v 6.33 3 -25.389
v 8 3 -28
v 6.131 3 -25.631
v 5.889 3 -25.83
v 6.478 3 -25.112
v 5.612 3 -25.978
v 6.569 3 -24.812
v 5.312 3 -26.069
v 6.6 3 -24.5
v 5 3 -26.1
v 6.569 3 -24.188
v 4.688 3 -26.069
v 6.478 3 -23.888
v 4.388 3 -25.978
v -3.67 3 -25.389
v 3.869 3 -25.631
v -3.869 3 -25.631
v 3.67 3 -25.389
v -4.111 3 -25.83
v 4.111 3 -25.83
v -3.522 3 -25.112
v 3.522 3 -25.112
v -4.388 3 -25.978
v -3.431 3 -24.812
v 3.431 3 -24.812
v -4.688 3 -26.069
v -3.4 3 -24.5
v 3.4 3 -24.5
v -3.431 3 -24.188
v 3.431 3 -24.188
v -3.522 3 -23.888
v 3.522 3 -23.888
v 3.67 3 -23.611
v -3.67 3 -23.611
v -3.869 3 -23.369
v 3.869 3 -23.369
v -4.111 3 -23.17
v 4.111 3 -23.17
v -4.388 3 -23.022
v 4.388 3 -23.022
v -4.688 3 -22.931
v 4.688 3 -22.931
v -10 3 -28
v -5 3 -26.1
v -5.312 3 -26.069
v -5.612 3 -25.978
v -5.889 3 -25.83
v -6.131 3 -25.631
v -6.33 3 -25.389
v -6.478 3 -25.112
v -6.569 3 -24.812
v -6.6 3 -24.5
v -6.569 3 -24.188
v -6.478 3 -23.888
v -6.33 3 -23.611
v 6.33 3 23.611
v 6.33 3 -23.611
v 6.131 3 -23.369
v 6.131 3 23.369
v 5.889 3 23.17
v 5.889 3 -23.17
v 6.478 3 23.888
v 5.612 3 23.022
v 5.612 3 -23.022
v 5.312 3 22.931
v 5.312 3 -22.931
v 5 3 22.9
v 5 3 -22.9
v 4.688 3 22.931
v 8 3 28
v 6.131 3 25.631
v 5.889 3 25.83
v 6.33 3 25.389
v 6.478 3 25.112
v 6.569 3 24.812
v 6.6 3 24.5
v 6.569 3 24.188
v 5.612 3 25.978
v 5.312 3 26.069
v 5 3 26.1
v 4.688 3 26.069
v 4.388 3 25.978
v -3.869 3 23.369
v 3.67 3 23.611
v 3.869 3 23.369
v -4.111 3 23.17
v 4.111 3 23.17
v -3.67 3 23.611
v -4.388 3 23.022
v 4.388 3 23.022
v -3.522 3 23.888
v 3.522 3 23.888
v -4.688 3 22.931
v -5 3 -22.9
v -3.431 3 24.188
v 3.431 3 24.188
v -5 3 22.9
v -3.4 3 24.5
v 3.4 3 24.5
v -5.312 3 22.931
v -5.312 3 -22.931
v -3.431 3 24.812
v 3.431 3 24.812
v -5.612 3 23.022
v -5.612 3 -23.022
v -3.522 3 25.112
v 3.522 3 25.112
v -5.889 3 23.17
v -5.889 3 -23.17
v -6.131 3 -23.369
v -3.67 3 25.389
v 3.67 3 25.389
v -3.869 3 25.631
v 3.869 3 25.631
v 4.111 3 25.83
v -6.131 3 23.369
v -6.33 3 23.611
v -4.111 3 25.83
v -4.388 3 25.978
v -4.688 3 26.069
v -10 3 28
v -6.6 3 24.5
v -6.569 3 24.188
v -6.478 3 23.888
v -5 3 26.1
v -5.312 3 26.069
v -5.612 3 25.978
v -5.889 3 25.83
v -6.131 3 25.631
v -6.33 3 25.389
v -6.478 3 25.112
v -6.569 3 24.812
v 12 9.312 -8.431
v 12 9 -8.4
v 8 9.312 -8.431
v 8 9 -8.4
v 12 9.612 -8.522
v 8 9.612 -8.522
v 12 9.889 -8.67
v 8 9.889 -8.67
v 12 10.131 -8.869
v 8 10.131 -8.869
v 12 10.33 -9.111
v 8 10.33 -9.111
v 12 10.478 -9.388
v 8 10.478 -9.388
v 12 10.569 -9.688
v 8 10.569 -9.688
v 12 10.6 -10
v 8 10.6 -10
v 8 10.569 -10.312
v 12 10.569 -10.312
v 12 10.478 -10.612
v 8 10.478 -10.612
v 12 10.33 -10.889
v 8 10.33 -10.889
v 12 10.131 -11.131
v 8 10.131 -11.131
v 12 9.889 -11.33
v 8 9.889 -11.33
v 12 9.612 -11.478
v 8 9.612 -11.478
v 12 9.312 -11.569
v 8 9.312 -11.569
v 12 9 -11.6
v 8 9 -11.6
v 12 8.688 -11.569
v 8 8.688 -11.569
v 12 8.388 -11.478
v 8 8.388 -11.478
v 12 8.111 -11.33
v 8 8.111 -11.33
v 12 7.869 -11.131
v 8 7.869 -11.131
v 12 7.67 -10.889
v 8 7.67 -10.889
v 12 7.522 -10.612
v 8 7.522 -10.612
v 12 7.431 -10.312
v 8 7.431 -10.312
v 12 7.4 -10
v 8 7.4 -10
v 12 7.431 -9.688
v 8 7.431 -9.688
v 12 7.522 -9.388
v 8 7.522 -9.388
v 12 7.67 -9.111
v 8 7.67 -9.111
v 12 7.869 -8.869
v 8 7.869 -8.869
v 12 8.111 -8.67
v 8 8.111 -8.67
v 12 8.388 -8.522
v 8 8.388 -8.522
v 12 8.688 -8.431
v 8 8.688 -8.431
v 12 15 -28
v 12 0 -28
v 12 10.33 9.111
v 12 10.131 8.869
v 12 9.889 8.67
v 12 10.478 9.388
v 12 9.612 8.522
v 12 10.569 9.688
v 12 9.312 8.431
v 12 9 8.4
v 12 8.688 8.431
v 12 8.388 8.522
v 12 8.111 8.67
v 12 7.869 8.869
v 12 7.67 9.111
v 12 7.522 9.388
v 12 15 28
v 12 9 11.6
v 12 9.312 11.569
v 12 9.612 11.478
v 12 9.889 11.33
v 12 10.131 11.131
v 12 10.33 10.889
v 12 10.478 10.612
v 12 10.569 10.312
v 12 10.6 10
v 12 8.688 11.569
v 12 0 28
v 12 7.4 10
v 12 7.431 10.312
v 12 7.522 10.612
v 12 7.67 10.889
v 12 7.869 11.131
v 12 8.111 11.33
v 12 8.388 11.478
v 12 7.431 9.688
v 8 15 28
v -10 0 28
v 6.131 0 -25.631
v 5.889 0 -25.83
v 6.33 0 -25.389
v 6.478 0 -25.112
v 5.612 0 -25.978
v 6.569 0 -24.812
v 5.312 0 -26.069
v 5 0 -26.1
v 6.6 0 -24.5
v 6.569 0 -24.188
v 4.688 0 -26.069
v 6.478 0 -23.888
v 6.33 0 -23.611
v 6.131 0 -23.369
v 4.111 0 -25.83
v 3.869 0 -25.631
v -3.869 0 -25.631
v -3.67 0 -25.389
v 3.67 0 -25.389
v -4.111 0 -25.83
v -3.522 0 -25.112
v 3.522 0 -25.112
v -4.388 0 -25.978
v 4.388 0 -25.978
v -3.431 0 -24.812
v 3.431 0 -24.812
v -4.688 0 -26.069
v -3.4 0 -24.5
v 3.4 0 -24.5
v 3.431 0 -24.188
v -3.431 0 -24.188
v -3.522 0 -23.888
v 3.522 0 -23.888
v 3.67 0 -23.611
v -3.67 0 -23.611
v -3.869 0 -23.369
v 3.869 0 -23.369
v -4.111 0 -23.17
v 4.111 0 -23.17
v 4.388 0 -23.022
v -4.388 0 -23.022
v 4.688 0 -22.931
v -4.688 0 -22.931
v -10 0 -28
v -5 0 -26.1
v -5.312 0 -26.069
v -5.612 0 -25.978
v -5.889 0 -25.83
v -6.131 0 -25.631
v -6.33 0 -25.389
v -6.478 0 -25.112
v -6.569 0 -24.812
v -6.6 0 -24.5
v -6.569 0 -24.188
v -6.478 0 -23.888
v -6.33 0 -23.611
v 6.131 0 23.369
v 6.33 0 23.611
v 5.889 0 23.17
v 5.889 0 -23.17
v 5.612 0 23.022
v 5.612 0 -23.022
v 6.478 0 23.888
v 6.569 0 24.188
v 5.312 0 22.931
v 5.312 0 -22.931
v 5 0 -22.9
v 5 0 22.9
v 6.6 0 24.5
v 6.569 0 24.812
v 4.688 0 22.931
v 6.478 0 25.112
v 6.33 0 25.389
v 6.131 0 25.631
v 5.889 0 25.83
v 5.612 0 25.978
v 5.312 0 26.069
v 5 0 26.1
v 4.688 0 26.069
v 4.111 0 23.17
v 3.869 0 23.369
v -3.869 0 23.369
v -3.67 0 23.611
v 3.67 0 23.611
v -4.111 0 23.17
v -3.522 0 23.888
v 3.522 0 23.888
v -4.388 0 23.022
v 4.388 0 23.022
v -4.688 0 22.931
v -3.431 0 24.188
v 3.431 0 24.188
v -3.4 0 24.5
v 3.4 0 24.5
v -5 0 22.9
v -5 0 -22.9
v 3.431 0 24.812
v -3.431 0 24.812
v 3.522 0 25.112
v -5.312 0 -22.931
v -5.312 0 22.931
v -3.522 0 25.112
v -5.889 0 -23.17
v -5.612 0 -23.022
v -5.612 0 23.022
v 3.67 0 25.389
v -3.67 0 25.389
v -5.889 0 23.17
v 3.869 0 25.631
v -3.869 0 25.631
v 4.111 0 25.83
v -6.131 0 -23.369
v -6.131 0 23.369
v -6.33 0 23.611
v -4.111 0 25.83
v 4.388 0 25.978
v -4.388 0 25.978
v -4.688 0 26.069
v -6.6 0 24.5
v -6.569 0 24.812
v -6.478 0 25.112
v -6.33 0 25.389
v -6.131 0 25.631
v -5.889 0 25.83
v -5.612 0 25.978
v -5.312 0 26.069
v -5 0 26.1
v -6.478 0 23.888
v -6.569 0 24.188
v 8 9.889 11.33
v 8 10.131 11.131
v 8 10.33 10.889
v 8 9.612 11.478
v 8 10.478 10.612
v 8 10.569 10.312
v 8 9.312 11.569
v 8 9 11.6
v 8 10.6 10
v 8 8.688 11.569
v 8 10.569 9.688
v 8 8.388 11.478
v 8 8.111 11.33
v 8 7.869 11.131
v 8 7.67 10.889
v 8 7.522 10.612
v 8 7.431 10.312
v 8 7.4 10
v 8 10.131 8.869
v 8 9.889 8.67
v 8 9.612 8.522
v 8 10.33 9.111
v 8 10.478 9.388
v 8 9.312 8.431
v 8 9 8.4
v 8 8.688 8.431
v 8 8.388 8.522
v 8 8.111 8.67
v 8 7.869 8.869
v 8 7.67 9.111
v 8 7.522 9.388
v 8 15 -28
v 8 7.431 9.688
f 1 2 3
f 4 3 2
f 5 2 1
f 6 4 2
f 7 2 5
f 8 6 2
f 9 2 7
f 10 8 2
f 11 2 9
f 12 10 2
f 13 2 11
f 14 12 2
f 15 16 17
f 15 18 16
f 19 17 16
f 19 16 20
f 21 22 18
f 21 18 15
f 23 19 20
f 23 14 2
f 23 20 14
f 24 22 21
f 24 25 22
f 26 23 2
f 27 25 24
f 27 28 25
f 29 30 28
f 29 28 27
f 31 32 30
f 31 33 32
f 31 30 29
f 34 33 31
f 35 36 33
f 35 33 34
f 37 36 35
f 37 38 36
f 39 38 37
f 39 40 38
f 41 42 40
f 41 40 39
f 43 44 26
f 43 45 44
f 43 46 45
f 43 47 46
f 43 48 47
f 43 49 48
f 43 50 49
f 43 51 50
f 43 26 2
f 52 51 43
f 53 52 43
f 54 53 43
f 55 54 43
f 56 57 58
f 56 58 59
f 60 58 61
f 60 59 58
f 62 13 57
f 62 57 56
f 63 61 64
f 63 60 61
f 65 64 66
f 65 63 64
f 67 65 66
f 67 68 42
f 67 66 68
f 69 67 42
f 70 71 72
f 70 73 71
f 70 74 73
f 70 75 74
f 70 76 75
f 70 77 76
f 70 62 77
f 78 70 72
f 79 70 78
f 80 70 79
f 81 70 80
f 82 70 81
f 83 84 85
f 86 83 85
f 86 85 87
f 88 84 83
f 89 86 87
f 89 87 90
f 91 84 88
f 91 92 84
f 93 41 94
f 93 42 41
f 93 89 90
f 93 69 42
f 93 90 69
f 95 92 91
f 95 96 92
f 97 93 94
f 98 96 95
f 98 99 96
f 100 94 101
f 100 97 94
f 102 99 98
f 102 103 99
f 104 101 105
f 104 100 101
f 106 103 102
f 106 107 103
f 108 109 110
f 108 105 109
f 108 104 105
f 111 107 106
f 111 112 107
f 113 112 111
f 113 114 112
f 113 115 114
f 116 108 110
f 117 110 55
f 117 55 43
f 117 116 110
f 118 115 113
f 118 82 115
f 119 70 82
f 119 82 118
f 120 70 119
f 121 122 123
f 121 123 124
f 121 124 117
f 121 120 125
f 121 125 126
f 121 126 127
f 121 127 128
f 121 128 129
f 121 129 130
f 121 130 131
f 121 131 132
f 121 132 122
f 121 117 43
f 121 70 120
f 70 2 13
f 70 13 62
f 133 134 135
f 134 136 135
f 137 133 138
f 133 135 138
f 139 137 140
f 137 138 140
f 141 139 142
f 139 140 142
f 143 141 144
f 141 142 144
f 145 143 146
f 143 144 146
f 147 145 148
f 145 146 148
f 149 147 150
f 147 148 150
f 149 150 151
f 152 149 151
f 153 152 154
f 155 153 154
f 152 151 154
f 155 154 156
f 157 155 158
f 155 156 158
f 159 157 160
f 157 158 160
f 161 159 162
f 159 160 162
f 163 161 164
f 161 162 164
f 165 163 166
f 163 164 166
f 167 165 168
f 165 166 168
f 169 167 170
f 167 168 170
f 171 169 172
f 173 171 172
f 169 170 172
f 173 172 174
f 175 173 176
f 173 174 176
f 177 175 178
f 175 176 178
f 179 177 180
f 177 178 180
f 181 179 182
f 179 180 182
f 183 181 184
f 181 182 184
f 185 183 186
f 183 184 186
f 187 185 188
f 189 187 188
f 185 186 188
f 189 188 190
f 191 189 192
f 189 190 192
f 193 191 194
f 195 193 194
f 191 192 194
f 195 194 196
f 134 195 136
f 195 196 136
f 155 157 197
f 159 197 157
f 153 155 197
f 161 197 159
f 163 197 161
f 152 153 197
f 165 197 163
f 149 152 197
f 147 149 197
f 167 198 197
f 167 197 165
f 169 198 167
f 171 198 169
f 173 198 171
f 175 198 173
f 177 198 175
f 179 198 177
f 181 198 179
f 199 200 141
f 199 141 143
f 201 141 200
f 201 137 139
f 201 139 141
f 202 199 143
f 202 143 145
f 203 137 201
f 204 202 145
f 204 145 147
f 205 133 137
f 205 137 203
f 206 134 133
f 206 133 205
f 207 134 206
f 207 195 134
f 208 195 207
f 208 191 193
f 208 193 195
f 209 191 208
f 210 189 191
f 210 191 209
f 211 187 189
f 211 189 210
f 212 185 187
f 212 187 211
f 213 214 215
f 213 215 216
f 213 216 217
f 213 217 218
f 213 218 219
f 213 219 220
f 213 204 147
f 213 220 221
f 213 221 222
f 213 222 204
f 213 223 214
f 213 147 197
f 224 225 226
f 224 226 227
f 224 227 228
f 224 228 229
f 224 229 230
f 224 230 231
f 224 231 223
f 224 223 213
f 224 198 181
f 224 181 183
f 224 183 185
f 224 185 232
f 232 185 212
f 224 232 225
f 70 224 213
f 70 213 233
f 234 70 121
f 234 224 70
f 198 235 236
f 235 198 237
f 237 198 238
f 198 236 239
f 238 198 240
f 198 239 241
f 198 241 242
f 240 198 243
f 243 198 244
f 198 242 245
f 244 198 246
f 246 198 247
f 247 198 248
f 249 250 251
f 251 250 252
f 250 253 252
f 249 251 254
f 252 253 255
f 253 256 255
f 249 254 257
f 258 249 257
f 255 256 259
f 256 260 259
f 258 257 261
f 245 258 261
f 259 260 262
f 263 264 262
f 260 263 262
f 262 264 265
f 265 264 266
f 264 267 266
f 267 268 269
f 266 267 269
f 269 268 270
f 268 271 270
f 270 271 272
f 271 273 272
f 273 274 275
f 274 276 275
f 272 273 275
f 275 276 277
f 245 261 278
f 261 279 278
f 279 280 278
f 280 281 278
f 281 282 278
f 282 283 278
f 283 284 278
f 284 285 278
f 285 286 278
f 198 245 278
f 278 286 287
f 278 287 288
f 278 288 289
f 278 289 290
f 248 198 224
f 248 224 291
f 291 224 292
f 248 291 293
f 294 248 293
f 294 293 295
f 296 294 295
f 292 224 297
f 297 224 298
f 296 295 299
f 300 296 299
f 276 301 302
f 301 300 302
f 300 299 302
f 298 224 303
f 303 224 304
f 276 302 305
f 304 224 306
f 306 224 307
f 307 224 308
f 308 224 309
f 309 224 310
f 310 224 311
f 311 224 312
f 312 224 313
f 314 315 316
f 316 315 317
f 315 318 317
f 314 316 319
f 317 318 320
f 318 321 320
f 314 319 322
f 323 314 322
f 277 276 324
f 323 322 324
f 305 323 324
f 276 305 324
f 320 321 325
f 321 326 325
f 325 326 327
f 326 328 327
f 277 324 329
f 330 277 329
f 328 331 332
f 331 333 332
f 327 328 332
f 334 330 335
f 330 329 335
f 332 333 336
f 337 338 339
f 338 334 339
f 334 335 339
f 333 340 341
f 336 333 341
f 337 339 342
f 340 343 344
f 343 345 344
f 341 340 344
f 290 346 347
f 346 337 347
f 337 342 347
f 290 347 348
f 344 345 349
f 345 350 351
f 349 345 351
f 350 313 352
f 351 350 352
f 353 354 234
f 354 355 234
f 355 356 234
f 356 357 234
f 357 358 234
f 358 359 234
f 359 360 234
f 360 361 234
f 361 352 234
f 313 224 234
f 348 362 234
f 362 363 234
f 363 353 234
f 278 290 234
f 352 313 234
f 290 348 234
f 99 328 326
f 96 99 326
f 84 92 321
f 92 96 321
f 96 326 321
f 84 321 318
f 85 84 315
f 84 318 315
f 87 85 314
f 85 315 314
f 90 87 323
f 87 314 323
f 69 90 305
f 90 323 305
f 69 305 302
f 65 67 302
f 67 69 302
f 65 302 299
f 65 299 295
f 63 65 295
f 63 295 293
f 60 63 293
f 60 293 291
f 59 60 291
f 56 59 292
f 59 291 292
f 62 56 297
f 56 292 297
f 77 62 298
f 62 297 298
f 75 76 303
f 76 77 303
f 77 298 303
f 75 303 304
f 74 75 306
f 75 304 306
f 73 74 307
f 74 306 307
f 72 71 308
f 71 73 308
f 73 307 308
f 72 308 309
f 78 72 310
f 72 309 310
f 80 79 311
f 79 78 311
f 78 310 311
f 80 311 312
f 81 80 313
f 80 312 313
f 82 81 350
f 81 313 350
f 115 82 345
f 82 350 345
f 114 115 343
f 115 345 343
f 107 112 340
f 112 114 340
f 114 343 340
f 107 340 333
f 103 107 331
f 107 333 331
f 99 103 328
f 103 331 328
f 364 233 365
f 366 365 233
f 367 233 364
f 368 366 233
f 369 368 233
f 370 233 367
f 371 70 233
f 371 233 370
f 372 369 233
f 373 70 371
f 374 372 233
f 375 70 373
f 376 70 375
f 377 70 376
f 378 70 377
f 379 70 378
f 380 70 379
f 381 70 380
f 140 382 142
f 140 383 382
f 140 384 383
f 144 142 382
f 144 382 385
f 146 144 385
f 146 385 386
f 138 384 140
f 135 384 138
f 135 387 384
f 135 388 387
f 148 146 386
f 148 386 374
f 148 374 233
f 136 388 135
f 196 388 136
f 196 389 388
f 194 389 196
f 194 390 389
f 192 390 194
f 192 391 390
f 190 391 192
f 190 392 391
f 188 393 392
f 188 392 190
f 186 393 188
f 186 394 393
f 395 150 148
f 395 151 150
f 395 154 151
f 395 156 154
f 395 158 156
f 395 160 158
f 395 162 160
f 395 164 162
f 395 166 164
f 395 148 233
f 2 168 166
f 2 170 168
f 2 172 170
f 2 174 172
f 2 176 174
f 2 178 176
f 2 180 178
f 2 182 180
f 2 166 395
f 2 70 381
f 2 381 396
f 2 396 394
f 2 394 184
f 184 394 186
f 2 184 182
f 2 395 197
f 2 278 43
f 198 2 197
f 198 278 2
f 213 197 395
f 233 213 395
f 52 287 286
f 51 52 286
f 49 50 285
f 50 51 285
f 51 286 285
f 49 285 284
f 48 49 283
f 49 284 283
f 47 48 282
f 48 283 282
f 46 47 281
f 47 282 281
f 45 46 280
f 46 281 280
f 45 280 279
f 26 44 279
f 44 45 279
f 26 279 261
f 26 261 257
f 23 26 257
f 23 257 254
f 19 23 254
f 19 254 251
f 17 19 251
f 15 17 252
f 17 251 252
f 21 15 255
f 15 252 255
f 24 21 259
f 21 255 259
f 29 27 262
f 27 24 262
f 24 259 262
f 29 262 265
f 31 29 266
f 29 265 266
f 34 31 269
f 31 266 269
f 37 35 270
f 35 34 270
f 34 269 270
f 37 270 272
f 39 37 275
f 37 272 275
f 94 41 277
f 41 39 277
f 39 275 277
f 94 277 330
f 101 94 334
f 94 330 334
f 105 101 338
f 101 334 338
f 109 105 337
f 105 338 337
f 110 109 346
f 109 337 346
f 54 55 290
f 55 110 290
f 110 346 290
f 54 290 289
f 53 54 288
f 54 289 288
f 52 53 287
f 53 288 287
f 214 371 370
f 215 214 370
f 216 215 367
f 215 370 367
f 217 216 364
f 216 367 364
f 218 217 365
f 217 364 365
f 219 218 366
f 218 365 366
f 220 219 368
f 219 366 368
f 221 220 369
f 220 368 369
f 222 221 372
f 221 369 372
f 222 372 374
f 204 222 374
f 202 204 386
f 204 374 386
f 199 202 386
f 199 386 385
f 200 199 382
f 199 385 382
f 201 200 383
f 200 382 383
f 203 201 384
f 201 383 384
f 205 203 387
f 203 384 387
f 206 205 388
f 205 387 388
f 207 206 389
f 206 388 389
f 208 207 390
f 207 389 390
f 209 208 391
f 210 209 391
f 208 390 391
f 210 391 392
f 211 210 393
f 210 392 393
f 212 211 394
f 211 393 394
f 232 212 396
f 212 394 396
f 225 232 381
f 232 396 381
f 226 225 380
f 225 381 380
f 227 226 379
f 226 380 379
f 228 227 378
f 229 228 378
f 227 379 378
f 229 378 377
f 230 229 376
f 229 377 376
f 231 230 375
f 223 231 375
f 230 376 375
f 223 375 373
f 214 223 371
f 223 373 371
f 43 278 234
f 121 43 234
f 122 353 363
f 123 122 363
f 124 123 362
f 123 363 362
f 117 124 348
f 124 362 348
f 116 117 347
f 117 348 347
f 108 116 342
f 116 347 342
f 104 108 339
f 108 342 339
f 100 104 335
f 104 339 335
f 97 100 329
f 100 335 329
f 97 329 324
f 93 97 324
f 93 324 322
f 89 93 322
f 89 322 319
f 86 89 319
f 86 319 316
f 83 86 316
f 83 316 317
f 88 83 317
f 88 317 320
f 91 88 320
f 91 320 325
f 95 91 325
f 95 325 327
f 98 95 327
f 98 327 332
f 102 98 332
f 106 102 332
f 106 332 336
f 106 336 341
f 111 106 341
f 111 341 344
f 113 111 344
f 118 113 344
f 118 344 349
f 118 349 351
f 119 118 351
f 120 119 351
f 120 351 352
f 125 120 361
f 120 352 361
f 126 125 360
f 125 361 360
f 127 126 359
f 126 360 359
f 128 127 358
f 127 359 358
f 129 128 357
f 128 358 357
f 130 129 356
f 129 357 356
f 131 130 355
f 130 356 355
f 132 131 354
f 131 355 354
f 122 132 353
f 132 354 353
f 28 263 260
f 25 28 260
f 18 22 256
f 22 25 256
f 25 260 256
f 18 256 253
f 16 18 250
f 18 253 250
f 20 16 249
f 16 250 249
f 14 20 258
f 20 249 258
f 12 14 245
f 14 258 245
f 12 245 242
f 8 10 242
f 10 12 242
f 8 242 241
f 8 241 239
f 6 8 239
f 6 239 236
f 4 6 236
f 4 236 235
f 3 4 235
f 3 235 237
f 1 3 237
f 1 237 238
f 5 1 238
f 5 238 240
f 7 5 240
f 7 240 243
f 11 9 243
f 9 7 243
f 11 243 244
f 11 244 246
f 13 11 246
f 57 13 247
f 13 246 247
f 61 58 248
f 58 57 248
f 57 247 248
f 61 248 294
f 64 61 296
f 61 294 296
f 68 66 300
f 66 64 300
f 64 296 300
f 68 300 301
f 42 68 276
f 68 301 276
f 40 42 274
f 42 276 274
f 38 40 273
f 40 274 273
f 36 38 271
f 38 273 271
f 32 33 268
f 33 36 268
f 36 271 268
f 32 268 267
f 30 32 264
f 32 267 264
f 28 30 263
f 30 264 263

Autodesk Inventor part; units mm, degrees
ref_plane "YZ Plane" through (0, 0, 0) normal (1, 0, 0) x (0, 1, 0)
ref_plane "XZ Plane" through (0, 0, 0) normal (0, 1, 0) x (-1, 0, 0)
ref_plane "XY Plane" through (0, 0, 0) normal (0, 0, 1) x (1, 0, 0)
sketch "Sketch1" plane through (0, 0, 0) normal (0, 1, 0) x (-1, 0, 0)
  line L0 (14.3928, 0) -> (-16, 0) construction
  line L1 (0, 16.4961) -> (0, -25.3301) construction
  circle A0 centre (5, 24.5) radius 1.6
  line L2 (10, 24.5) -> (10, 30)
  line L3 (10, 30) -> (5, 30)
  line L4 (5, 30) -> (0, 30)
  line L5 (0, 30) -> (0, 24.5)
  line L6 (5, 24.5) -> (5, 26.1)
  line L7 (0, 24.5) -> (0, 0)
  line L8 (0, 0) -> (10, 0)
  line L9 (10, 0) -> (10, 24.5)
  circle A1 centre (5, -24.5) radius 1.6
  line L10 (10, -24.5) -> (10, -30)
  line L11 (10, -30) -> (5, -30)
  line L12 (5, -30) -> (0, -30)
  line L13 (0, -30) -> (0, -24.5)
  line L14 (0, -24.5) -> (0, 0)
  line L15 (10, 0) -> (10, -24.5)
  circle A2 centre (-5, 24.5) radius 1.6
  line L16 (-10, 24.5) -> (-10, 30)
  line L17 (-10, 30) -> (-5, 30)
  line L18 (-5, 30) -> (0, 30)
  line L19 (-10, 0) -> (-10, 24.5)
  circle A3 centre (-5, -24.5) radius 1.6
  line L20 (-10, -24.5) -> (-10, -30)
  line L21 (-10, -30) -> (-5, -30)
  line L22 (-5, -30) -> (0, -30)
  line L23 (-10, 0) -> (-10, -24.5)
  line L24 (-10, 30) -> (-8, 30)
  line L25 (-8, 30) -> (-8, -30)
  line L26 (-8, -30) -> (-10, -30)
  line L27 (-10, -30) -> (-10, 30)
  line L28 (10, 30) -> (-10, 30)
  line L29 (-10, 30) -> (-10, 28)
  line L30 (-10, 28) -> (10, 28)
  line L31 (10, 28) -> (10, 30)
  line L32 (-10, -30) -> (10, -30)
  line L33 (10, -30) -> (10, -28)
  line L34 (10, -28) -> (-10, -28)
  line L35 (-10, -28) -> (-10, -30)
  line L36 (-10, -30) -> (-12, -30)
  line L37 (-12, -30) -> (-12, 30)
  line L38 (-12, 30) -> (-10, 30)
  line L39 (-10, 30) -> (-10, -30)
  line L40 (-10, -28) -> (-12, -28)
  line L41 (-10, 28) -> (-12, 28)
  point P0 (5, 27.25)
  point P1 (-8, -28)
  point P2 (-8, 28)
  dimension "d0" = 3.2
  dimension "d2" = 24.5
  dimension "d3" = 5
  dimension "d6" = 2
extrude "Extrusion1" add sketch "Sketch1" along normal blind 3 contours L9 L8 L7 L5 L30 L2 | L15 L10 L34 L13 L14 L8 | L5 L7 L14 L13 L34 L25 L30 | L25 L34 L20 L23 L19 L16 L30
extrude "Extrusion2" add sketch "Sketch1" along normal blind 15 contours L25 L34 L20 L23 L19 L16 L30 | L16 L19 L23 L20 L40 L37 L41
sketch "Sketch2" plane through (8, 3, 30) normal (-1, 0, 0) x (0, 0, 1)
  line L0 (-58, 12) -> (-2, 12) projected
  line L1 (-30, 12) -> (-30, 0)
  line L2 (-2, 0) -> (-58, 0) projected
  circle A0 centre (-20, 6) radius 1.6
  circle A1 centre (-20, 6) radius 2.75
  circle A2 centre (-40, 6) radius 1.6
  circle A3 centre (-40, 6) radius 2.75
  point P0 (-30, -3)
  point P1 (-60, 12)
  point P2 (0, 12)
  point P3 (0, 0)
  point P4 (-60, 0)
  dimension "d9" = 3.2
  dimension "d10" = 5.5
  dimension "d13" = 10
extrude "Extrusion3" cut sketch "Sketch2" against normal blind 15 contours A0 | A2
properties part number "Holder Servo Lifter_3DPrint"
